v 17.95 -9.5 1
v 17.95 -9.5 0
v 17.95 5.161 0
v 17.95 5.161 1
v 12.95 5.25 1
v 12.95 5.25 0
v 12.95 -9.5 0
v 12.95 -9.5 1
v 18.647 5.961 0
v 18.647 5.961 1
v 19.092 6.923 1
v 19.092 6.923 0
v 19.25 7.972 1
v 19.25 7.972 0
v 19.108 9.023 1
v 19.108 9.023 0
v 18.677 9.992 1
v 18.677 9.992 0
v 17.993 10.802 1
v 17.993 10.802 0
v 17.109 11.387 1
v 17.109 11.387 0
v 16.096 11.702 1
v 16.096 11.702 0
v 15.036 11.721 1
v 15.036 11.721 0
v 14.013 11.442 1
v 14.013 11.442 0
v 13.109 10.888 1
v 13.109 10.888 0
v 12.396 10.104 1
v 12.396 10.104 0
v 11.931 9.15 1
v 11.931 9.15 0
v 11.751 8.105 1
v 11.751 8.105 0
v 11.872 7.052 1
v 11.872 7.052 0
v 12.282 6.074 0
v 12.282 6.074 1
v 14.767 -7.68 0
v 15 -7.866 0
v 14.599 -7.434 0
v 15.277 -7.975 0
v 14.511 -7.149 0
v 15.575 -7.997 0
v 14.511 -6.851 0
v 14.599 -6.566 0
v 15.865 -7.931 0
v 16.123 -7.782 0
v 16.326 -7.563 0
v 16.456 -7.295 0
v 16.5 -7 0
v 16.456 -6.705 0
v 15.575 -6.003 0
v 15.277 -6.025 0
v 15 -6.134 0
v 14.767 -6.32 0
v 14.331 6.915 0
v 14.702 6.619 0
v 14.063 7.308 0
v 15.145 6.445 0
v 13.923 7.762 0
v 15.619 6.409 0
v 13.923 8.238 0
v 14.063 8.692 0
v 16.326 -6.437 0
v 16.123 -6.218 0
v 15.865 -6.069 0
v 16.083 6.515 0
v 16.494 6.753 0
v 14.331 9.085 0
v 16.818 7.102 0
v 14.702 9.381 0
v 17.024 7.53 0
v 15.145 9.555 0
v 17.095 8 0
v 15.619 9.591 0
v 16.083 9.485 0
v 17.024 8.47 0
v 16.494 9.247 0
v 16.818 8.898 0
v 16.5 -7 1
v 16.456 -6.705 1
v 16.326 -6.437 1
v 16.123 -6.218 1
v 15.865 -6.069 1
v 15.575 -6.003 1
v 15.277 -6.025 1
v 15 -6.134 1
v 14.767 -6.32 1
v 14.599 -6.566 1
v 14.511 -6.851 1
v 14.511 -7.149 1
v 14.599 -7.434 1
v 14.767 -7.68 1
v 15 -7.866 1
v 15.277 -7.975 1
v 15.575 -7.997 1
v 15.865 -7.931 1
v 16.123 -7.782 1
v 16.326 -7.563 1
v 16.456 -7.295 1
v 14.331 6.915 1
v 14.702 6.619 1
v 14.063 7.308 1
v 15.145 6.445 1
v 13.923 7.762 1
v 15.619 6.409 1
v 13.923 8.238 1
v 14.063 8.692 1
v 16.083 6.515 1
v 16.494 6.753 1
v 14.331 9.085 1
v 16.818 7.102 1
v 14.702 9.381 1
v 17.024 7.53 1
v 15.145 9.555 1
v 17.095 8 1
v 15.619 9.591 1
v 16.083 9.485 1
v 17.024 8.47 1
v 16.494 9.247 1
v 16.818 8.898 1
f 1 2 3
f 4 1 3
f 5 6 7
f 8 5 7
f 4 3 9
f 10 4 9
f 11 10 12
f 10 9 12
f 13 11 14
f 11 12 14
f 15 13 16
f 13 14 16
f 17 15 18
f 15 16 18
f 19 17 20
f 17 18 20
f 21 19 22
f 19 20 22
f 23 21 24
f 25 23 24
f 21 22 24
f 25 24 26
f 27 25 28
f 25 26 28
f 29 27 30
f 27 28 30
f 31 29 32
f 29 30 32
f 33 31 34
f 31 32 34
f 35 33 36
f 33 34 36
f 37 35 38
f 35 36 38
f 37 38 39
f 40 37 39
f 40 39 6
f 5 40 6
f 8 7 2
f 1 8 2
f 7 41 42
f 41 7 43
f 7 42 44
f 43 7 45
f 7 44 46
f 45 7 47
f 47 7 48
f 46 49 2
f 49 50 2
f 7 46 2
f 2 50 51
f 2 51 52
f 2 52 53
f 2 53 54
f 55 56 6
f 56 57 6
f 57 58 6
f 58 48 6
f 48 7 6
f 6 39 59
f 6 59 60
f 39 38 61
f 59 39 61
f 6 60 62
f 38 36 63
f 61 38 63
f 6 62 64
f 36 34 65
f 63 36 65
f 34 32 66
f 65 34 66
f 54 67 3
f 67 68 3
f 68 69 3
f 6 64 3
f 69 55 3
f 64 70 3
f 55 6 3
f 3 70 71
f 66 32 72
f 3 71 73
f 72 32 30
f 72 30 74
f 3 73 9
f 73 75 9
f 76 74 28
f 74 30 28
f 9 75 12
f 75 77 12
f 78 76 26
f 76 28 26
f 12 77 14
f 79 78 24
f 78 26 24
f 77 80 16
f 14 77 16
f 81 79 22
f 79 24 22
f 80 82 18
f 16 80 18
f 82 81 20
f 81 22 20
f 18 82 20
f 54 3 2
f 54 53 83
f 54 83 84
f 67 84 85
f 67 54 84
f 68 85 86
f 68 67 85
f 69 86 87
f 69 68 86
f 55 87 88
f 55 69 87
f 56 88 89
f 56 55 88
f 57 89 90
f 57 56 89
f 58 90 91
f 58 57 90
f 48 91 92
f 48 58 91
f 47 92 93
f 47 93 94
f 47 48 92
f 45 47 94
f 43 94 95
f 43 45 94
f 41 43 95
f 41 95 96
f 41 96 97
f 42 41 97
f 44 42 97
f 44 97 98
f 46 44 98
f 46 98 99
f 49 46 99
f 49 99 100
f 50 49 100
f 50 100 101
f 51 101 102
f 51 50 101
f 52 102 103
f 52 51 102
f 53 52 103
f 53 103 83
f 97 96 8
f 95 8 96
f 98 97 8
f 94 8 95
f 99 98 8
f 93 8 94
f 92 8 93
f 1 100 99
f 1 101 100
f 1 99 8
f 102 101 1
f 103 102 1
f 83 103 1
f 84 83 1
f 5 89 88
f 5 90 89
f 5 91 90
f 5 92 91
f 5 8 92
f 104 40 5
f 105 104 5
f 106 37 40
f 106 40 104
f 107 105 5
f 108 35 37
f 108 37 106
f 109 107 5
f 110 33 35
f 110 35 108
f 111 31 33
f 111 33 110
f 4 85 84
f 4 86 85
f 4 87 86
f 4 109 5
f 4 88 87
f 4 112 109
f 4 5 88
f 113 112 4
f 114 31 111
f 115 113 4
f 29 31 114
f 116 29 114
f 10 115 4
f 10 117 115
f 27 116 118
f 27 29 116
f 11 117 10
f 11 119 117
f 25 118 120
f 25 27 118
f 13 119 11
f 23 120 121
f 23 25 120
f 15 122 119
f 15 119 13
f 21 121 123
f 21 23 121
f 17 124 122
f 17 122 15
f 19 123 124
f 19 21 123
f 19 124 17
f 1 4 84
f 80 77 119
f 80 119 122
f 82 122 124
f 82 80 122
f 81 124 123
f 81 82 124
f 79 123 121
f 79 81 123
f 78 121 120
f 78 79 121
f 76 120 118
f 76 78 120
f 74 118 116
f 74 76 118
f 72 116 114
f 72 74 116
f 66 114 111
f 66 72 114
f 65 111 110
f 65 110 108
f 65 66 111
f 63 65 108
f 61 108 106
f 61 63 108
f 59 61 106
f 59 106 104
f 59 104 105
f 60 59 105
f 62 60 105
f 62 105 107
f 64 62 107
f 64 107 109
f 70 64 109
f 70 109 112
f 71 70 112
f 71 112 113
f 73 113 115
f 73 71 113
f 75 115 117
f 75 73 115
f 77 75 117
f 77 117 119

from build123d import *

# Parameters (mm, degrees)
SKETCH1_R           = 1.595
SKETCH1_R_2         = 1
BOSS_EXTRUDE1_DEPTH = 1


with BuildPart() as part:
    # Sketch1 → Boss-Extrude1 (new body)
    with BuildSketch(Plane.XY):
        with BuildLine():
            Line((12.950297731, 5.25017849), (12.950297731, -9.5))
            Line((12.950297731, -9.5), (17.950297731, -9.5))
            Line((17.950297731, -9.5), (17.950297731, 5.161243048))
            ThreePointArc((17.950297731, 5.161243048), (15.566691032, 11.749406927), (12.950297731, 5.25017849))
        make_face()
        with Locations((15.5, 8)):
            Circle(SKETCH1_R, mode=Mode.SUBTRACT)
        with Locations((15.5, -7)):
            Circle(SKETCH1_R_2, mode=Mode.SUBTRACT)
    extrude(amount=BOSS_EXTRUDE1_DEPTH)


solid = part.part
